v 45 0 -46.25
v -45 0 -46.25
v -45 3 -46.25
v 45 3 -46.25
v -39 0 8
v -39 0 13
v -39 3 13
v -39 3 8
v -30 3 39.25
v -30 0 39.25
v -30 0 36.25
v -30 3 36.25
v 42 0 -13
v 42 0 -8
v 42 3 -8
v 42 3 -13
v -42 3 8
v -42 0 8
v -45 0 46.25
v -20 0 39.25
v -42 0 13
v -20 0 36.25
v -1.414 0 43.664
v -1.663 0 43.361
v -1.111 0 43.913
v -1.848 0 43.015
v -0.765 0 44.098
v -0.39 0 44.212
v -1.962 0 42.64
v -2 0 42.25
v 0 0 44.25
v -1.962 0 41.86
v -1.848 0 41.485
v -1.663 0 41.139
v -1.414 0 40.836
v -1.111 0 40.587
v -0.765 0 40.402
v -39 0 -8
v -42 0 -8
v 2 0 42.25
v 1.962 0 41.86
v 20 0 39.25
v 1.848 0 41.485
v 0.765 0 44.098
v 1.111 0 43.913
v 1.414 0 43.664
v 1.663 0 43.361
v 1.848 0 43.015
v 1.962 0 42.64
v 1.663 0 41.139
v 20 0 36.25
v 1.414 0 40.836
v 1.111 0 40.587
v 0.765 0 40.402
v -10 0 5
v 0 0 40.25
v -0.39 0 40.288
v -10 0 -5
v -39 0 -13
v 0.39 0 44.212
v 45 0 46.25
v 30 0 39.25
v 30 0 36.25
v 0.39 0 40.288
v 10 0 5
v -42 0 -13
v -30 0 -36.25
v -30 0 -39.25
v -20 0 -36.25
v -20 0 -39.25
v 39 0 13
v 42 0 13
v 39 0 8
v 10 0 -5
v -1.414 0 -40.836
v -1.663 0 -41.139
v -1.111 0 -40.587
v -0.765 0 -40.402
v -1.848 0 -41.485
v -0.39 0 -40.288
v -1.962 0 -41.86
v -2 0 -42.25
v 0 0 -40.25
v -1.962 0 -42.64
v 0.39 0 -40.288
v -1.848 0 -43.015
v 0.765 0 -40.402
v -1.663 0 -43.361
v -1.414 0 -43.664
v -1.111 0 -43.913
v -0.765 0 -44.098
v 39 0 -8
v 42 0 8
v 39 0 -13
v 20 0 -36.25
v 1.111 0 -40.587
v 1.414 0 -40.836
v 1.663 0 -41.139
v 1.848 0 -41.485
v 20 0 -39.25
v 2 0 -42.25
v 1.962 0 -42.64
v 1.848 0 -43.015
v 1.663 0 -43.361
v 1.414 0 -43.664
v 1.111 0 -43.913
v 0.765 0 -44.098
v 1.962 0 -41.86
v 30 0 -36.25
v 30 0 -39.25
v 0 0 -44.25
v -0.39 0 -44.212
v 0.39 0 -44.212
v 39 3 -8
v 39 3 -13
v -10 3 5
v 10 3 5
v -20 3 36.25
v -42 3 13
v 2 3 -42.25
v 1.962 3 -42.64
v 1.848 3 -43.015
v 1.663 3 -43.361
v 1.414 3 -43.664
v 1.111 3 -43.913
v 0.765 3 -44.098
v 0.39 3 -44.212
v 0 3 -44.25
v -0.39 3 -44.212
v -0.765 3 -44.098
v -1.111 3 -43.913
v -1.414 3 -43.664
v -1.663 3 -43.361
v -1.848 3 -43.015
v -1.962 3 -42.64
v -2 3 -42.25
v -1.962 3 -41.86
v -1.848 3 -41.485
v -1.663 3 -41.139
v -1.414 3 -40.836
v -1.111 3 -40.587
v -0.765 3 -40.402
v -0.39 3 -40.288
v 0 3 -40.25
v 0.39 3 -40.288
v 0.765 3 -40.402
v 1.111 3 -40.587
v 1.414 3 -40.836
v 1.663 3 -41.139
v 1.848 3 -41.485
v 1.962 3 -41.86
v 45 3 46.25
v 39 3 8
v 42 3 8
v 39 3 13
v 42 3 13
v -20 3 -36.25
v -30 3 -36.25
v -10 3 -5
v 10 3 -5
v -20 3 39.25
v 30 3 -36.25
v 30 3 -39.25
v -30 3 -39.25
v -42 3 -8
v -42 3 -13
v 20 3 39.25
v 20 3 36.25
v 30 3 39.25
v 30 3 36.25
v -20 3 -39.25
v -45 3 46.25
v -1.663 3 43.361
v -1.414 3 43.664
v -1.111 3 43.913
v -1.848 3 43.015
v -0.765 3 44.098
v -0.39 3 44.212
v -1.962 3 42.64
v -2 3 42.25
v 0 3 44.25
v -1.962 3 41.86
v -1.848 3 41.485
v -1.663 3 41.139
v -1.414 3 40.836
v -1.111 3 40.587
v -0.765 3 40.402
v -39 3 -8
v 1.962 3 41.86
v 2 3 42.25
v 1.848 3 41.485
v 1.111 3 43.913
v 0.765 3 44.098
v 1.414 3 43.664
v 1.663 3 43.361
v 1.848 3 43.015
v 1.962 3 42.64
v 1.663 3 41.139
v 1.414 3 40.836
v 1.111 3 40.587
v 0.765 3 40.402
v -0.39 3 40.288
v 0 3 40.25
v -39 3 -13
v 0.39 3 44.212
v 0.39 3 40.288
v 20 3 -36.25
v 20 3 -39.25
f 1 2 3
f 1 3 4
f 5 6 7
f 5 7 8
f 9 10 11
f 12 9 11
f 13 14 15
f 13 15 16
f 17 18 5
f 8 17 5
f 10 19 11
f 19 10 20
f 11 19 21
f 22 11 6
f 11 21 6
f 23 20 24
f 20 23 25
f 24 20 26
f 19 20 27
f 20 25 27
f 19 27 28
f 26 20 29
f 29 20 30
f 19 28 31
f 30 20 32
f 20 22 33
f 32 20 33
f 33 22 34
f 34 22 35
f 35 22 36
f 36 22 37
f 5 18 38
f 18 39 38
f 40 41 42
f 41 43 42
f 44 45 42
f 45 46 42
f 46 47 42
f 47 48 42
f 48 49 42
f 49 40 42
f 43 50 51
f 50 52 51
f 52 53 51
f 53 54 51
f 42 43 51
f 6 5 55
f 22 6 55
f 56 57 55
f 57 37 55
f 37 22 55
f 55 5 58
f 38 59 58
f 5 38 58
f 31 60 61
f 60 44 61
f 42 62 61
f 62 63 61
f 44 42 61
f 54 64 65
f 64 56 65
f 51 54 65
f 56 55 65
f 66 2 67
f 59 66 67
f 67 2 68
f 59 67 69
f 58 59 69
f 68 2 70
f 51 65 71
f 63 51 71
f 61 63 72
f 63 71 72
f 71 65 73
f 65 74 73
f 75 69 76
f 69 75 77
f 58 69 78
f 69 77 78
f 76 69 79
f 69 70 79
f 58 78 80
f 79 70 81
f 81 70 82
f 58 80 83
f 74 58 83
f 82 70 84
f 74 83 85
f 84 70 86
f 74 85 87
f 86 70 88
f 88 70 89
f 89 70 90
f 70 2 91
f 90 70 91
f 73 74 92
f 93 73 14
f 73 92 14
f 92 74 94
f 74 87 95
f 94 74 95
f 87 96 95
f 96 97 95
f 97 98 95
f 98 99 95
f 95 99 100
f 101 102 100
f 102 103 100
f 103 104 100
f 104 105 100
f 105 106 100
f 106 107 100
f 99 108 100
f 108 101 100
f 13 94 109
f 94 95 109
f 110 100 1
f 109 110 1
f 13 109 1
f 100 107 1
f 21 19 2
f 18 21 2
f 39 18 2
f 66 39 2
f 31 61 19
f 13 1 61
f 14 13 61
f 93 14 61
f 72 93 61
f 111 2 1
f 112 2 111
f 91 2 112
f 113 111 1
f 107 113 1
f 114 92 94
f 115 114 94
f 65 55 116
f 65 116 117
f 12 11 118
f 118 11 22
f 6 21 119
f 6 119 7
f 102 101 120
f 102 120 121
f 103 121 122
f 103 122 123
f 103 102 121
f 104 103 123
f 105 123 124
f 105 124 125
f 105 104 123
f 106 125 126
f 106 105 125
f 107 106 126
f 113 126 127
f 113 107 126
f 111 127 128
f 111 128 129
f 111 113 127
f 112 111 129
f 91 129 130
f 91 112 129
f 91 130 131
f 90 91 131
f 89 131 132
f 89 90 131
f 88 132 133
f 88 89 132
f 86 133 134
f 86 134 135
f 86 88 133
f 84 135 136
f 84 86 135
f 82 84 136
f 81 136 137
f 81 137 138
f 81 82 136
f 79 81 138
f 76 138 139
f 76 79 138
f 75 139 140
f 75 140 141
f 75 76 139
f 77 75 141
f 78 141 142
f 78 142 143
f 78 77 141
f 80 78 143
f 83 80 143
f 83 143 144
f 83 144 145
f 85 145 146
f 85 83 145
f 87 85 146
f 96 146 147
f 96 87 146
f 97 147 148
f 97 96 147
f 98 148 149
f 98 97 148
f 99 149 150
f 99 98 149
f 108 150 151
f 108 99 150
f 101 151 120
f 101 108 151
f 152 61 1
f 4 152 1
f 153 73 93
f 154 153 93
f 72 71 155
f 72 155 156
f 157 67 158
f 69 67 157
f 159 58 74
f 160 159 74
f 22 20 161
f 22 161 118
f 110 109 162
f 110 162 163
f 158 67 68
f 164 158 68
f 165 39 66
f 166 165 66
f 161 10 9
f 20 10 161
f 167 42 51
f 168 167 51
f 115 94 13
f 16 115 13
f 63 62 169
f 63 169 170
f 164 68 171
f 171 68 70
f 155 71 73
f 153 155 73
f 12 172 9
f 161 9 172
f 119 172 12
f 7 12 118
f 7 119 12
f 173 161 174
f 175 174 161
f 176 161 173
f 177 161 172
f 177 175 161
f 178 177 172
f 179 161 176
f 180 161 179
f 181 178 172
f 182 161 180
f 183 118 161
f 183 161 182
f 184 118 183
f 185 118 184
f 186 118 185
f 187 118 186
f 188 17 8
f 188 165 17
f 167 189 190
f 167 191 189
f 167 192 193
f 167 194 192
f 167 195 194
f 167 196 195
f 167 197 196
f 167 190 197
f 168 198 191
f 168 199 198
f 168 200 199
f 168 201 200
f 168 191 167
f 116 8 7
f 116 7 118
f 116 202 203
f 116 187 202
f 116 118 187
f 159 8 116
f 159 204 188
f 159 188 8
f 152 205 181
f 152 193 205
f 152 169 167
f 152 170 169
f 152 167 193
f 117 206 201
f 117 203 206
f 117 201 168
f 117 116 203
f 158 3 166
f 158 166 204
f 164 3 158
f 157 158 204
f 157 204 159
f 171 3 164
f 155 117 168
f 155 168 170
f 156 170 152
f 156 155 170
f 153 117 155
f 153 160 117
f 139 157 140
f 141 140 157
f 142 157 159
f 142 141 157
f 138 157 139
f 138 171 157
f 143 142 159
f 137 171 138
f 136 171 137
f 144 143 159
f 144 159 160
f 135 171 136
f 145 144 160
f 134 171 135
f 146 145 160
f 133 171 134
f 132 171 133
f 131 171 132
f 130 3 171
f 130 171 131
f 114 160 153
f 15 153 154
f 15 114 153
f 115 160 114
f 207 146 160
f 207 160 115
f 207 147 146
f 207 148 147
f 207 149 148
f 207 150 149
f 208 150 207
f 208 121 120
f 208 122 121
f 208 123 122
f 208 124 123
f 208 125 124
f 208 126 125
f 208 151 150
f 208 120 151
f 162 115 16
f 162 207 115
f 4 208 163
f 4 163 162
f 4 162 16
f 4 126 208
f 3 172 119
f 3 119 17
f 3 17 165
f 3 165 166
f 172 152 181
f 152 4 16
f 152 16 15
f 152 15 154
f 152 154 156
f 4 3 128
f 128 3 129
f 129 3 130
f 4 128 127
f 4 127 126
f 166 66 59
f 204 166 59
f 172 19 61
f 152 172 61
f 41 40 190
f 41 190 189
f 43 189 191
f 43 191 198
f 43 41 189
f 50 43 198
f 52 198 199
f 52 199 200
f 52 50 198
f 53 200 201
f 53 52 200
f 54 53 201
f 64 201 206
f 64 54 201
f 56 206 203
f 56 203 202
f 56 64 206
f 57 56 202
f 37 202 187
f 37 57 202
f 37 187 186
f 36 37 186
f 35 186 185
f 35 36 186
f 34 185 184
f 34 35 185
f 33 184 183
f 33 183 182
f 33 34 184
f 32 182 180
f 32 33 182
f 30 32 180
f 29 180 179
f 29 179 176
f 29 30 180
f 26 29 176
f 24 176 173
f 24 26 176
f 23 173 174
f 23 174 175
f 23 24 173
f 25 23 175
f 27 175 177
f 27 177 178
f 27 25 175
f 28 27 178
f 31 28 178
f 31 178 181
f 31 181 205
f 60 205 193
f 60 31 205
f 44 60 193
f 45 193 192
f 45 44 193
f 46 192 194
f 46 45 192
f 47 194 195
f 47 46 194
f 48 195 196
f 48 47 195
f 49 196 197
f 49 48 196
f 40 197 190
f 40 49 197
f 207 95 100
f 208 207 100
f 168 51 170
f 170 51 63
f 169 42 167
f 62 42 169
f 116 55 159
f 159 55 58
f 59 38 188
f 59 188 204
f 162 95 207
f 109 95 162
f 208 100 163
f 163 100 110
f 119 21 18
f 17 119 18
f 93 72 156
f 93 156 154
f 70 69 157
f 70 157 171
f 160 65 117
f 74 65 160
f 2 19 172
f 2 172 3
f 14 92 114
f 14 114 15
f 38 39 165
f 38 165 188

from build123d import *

# Parameters (mm, degrees)
SKETCH2_W           = 90
SKETCH2_H           = 92.5
SKETCH2_R           = 2
SKETCH2_W_2         = 10
SKETCH2_H_2         = 3
SKETCH2_W_3         = 3
SKETCH2_H_3         = 5
SKETCH2_W_4         = 20
SKETCH2_H_4         = 10
BOSS_EXTRUDE1_DEPTH = 3


with BuildPart() as part:
    # Sketch2 → Boss-Extrude1 (new body)
    with BuildSketch(Plane(origin=(0, 0, 0), x_dir=(1, 0, 0), z_dir=(0, 1, 0))):
        Rectangle(SKETCH2_W, SKETCH2_H)
        with Locations((0, -42.25)):
            Circle(SKETCH2_R, mode=Mode.SUBTRACT)
        with Locations((0, 42.25)):
            Circle(SKETCH2_R, mode=Mode.SUBTRACT)
        with Locations((-25, 37.75)):
            Rectangle(SKETCH2_W_2, SKETCH2_H_2, mode=Mode.SUBTRACT)
        with Locations((-40.5, 10.5)):
            Rectangle(SKETCH2_W_3, SKETCH2_H_3, mode=Mode.SUBTRACT)
        with Locations((25, 37.75)):
            Rectangle(SKETCH2_W_2, SKETCH2_H_2, mode=Mode.SUBTRACT)
        with Locations((25, -37.75)):
            Rectangle(SKETCH2_W_2, SKETCH2_H_2, mode=Mode.SUBTRACT)
        with Locations((-25, -37.75)):
            Rectangle(SKETCH2_W_2, SKETCH2_H_2, mode=Mode.SUBTRACT)
        with Locations((-40.5, -10.5)):
            Rectangle(SKETCH2_W_3, SKETCH2_H_3, mode=Mode.SUBTRACT)
        with Locations((40.5, 10.5)):
            Rectangle(SKETCH2_W_3, SKETCH2_H_3, mode=Mode.SUBTRACT)
        with Locations((40.5, -10.5)):
            Rectangle(SKETCH2_W_3, SKETCH2_H_3, mode=Mode.SUBTRACT)
        Rectangle(SKETCH2_W_4, SKETCH2_H_4, mode=Mode.SUBTRACT)
    extrude(amount=BOSS_EXTRUDE1_DEPTH)


solid = part.part
